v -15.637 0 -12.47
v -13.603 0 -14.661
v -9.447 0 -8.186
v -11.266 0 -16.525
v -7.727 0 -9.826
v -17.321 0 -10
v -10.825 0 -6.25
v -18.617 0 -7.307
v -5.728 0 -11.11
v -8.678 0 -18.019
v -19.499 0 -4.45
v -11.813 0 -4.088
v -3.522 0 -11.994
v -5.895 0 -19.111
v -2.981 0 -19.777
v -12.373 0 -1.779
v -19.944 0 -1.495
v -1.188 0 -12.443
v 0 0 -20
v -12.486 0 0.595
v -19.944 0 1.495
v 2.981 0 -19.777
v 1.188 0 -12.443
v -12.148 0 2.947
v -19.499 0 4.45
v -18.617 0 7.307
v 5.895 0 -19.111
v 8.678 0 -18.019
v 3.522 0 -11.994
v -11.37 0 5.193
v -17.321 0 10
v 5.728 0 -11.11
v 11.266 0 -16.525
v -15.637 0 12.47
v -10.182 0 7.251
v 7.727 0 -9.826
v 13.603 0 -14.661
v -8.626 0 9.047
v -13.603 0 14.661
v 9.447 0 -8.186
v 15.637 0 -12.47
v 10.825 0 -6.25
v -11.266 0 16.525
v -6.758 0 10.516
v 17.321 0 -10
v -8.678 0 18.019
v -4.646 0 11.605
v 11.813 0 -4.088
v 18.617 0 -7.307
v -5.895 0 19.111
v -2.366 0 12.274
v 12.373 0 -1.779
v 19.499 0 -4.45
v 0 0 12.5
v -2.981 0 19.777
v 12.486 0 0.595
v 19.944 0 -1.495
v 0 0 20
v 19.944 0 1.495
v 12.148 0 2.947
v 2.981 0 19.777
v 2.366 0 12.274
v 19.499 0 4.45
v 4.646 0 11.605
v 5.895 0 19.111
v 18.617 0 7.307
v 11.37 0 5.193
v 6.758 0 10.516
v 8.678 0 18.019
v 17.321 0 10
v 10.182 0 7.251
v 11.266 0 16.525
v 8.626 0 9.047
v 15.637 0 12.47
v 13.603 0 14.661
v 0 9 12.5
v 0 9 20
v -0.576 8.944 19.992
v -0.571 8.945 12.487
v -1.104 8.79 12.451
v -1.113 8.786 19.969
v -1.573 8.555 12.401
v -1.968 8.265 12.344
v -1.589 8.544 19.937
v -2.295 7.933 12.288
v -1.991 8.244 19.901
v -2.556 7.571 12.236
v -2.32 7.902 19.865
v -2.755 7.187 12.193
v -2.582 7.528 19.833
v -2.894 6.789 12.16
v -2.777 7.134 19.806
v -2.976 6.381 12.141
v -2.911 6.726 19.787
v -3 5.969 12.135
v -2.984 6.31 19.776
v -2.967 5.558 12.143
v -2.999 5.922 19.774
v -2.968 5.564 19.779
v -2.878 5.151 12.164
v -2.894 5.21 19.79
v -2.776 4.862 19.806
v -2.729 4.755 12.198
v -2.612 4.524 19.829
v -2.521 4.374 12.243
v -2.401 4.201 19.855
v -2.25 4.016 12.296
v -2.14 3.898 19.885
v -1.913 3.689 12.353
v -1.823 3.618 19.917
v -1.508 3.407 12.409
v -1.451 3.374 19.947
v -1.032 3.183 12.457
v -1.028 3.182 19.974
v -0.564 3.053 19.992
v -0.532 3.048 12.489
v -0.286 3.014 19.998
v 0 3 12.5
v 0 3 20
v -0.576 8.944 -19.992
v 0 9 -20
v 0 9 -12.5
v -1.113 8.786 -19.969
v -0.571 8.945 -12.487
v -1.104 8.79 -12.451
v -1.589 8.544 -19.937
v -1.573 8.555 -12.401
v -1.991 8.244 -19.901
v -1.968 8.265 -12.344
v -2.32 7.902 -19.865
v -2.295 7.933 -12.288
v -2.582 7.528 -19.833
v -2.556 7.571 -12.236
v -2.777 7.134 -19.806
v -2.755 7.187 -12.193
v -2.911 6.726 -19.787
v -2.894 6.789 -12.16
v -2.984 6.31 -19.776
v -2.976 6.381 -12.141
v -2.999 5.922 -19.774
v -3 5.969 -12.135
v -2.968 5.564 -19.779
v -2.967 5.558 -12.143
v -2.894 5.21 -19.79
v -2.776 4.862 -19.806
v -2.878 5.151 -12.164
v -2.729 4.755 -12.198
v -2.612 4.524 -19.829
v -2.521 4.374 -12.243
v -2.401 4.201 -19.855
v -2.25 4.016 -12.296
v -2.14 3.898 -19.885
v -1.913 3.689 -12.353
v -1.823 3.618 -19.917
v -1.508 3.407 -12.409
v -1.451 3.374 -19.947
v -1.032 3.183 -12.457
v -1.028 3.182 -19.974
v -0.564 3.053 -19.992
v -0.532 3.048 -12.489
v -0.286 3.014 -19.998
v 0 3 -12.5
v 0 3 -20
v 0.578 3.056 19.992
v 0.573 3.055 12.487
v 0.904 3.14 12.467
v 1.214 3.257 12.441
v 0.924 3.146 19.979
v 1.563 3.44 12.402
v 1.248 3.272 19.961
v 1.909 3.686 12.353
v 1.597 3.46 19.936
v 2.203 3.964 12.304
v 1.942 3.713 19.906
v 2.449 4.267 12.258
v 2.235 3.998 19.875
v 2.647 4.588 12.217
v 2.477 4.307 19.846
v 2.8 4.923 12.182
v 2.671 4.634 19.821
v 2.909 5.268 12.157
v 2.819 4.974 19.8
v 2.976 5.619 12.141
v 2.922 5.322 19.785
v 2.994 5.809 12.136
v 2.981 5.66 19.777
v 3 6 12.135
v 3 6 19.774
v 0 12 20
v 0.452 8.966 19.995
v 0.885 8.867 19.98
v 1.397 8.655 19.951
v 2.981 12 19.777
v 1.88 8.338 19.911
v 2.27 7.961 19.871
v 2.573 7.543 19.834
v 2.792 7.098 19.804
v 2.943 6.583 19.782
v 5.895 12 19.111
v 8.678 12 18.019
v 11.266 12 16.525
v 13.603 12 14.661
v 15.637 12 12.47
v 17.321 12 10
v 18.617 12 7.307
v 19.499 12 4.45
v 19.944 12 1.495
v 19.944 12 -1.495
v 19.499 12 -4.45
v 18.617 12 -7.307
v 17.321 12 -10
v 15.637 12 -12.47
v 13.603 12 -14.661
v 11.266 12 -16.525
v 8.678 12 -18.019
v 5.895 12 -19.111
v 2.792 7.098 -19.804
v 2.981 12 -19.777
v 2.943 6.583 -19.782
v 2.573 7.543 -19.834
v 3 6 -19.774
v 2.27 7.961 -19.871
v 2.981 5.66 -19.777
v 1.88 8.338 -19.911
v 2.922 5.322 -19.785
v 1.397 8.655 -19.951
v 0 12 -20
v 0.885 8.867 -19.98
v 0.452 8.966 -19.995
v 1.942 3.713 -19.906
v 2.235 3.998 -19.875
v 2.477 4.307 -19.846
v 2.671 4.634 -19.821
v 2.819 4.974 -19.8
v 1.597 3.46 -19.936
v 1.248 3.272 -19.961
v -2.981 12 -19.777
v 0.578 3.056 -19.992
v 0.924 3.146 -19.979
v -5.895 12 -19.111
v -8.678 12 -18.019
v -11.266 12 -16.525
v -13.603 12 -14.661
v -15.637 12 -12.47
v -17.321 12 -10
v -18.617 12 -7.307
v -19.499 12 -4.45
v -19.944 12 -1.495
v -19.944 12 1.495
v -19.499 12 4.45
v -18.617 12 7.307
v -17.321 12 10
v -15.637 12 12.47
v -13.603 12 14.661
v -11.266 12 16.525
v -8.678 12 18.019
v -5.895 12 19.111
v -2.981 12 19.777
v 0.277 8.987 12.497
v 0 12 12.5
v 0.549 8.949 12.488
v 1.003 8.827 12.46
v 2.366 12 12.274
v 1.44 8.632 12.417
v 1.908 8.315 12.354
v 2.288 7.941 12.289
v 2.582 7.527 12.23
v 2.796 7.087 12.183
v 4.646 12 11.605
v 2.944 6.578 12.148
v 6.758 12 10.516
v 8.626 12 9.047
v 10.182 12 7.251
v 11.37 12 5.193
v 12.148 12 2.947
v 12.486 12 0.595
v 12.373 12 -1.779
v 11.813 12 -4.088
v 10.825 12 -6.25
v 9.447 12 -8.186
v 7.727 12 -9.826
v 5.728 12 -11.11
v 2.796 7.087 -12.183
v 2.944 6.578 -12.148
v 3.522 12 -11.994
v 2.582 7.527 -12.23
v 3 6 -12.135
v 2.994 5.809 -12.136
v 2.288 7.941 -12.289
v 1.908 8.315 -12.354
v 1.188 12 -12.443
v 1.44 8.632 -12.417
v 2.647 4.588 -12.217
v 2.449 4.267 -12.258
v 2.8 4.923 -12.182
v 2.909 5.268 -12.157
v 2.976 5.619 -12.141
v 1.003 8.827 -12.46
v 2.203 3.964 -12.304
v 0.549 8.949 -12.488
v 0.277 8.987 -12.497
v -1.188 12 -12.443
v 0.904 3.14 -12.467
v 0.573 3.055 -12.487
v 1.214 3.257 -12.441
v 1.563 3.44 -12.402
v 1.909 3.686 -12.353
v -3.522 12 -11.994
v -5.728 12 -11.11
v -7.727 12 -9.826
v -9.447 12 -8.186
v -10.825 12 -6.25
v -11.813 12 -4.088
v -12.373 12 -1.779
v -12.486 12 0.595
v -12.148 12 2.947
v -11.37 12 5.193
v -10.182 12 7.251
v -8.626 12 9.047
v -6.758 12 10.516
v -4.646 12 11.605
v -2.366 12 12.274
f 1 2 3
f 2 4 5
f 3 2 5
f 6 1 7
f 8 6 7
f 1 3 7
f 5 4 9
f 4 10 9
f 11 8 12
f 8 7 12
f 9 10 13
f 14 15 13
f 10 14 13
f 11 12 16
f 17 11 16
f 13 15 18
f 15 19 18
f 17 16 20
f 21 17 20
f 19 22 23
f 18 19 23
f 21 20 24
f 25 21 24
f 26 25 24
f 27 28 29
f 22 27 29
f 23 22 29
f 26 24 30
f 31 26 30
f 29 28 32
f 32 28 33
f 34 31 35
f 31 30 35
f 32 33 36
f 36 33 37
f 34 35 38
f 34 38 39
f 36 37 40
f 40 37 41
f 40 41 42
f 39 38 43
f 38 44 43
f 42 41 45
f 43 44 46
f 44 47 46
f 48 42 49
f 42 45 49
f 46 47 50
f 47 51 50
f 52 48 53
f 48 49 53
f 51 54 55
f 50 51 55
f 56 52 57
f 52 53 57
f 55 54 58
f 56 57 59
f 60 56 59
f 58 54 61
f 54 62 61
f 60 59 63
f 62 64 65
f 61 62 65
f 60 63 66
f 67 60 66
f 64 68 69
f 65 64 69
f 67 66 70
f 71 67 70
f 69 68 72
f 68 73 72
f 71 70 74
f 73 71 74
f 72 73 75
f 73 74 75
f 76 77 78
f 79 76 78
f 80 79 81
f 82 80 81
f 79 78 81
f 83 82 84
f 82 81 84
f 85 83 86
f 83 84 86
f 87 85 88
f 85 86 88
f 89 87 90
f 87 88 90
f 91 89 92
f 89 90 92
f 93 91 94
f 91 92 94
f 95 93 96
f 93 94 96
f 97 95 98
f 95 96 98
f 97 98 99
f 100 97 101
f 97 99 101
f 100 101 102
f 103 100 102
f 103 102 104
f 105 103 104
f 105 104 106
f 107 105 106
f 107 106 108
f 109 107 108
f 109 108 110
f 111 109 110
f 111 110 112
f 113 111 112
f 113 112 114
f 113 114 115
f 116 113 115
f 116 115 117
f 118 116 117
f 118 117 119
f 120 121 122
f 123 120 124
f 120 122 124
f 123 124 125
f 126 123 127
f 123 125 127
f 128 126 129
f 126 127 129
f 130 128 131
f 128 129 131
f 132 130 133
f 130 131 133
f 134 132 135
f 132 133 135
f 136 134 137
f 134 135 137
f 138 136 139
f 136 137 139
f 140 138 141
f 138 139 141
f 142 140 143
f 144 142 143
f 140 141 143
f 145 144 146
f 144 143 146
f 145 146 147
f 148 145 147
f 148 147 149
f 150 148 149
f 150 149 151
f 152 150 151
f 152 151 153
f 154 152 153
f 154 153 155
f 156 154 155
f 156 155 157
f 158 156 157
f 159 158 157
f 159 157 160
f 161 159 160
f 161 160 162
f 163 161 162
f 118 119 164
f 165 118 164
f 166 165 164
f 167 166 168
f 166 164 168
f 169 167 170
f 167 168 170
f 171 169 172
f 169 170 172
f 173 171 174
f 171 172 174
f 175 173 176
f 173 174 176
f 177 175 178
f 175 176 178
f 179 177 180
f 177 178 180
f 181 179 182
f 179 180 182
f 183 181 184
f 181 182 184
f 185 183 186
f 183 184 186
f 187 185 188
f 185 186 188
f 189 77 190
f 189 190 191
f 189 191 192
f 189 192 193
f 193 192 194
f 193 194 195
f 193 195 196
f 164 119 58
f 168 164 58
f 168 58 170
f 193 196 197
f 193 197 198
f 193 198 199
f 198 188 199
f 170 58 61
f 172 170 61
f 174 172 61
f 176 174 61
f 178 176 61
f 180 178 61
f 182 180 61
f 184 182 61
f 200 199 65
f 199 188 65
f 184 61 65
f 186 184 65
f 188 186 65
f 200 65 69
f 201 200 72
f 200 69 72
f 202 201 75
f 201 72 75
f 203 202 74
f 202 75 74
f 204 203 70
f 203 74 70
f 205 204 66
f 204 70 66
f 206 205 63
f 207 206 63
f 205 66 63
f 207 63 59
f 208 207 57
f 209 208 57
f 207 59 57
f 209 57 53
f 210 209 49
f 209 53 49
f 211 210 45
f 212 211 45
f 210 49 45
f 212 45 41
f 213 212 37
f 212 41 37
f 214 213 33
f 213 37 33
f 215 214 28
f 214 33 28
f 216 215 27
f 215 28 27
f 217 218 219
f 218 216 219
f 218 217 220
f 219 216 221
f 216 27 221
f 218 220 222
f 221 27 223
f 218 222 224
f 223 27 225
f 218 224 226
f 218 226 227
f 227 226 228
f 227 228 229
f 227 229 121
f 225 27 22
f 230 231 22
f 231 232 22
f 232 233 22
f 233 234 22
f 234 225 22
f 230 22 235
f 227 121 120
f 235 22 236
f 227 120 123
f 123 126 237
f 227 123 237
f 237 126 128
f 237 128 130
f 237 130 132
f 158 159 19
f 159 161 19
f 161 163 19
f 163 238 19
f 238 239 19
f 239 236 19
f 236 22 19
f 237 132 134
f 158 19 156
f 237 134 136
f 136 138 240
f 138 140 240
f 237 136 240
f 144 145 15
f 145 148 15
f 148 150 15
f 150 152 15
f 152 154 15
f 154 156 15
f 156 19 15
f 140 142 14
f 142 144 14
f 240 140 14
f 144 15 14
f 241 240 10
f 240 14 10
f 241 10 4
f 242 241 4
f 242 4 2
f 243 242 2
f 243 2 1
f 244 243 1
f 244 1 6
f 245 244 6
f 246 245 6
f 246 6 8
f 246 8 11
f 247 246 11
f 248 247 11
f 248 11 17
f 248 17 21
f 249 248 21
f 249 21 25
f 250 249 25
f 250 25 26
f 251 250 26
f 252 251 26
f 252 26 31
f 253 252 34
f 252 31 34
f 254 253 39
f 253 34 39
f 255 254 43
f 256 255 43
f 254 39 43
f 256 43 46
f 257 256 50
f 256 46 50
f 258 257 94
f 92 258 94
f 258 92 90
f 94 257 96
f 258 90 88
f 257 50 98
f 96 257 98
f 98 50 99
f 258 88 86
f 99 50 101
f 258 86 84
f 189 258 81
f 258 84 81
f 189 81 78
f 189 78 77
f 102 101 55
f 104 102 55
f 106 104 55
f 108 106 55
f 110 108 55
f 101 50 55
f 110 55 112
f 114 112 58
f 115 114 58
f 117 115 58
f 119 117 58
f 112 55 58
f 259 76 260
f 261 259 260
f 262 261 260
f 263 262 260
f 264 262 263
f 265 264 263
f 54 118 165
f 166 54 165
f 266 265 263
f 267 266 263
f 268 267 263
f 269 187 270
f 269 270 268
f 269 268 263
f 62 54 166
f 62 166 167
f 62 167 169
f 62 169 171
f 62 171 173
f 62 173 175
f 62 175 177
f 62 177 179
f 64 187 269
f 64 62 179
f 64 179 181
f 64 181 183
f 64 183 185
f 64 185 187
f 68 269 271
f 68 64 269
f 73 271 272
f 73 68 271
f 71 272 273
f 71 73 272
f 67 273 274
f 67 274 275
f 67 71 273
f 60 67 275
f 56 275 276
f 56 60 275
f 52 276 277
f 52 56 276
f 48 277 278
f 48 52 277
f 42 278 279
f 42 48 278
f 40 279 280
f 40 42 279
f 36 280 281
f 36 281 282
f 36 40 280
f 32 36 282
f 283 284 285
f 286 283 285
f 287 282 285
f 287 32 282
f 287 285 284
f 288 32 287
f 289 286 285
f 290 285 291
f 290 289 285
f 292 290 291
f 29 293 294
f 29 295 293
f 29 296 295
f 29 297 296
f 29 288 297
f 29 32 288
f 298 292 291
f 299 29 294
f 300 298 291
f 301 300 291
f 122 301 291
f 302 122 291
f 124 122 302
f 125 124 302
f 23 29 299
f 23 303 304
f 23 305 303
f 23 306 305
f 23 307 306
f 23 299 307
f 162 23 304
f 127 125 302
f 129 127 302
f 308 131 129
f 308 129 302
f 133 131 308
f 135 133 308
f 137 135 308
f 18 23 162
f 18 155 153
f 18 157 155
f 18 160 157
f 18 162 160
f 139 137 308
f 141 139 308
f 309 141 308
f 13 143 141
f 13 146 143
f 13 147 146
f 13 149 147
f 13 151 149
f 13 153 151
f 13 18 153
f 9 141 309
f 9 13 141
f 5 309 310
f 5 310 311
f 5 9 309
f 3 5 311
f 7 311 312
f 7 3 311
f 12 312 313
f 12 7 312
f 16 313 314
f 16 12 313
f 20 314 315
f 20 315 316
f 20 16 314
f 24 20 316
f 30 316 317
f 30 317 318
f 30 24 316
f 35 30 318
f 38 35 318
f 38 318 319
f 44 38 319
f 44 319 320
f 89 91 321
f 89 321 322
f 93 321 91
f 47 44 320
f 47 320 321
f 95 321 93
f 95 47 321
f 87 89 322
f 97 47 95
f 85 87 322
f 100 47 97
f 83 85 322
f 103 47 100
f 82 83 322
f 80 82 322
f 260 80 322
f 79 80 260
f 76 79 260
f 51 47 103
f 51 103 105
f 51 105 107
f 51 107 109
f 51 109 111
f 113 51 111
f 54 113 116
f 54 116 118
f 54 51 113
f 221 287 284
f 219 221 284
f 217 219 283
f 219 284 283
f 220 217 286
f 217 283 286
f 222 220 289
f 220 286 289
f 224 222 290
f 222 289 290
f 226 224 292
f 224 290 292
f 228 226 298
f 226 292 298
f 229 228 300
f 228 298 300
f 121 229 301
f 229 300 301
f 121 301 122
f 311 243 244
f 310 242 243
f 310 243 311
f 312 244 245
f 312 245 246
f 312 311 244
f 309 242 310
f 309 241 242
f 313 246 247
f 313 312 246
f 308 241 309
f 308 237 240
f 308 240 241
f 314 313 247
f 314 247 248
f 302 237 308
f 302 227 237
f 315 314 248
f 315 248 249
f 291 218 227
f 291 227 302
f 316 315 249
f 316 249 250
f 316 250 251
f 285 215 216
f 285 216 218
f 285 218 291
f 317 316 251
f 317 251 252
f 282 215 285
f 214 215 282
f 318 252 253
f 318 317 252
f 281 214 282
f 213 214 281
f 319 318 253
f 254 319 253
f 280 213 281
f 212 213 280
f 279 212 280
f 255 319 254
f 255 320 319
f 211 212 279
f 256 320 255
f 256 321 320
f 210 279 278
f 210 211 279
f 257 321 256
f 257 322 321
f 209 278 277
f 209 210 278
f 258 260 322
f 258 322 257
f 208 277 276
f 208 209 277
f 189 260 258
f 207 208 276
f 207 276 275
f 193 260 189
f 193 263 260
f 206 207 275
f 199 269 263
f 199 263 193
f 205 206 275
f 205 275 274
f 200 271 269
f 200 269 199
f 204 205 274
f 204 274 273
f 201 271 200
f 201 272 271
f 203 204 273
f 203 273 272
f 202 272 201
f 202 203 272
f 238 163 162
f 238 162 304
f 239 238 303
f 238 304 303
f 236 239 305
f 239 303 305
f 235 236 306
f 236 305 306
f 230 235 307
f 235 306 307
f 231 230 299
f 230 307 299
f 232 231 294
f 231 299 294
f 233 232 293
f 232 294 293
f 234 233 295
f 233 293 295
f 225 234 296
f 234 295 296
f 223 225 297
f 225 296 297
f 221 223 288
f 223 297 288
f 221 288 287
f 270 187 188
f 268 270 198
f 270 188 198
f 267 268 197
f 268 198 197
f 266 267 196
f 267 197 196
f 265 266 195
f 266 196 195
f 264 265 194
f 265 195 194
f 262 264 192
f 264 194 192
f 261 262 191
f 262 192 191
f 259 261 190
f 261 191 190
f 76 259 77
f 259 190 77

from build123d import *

# Parameters (mm, degrees)
SKETCH1_R           = 20
SKETCH1_R_2         = 12.5
BOSS_EXTRUDE1_DEPTH = 12
CUT_EXTRUDE1_DEPTH  = 62


with BuildPart() as part:
    # Sketch1 → Boss-Extrude1 (new body)
    with BuildSketch(Plane(origin=(0, 0, 0), x_dir=(1, 0, 0), z_dir=(0, 1, 0))):
        with Locations(Location((0, 0, 0), (0, 0, 270))):
            Circle(SKETCH1_R)
        with Locations(Location((0, 0, 0), (0, 0, 270))):
            Circle(SKETCH1_R_2, mode=Mode.SUBTRACT)
    extrude(amount=BOSS_EXTRUDE1_DEPTH)

    # Sketch3 → Cut-Extrude1 (cut)
    with BuildSketch(Plane.XY.offset(20)):
        with BuildLine():
            ThreePointArc((0, 9), (-3, 6), (0, 3))
            Line((0, 3), (0, 9))
        make_face()
        with BuildLine():
            Line((0, 9), (0, 3))
            ThreePointArc((0, 3), (2.121320344, 3.878679656), (3, 6))
            ThreePointArc((3, 6), (2.121320344, 8.121320344), (0, 9))
        make_face()
    extrude(amount=-CUT_EXTRUDE1_DEPTH, mode=Mode.SUBTRACT)


solid = part.part
